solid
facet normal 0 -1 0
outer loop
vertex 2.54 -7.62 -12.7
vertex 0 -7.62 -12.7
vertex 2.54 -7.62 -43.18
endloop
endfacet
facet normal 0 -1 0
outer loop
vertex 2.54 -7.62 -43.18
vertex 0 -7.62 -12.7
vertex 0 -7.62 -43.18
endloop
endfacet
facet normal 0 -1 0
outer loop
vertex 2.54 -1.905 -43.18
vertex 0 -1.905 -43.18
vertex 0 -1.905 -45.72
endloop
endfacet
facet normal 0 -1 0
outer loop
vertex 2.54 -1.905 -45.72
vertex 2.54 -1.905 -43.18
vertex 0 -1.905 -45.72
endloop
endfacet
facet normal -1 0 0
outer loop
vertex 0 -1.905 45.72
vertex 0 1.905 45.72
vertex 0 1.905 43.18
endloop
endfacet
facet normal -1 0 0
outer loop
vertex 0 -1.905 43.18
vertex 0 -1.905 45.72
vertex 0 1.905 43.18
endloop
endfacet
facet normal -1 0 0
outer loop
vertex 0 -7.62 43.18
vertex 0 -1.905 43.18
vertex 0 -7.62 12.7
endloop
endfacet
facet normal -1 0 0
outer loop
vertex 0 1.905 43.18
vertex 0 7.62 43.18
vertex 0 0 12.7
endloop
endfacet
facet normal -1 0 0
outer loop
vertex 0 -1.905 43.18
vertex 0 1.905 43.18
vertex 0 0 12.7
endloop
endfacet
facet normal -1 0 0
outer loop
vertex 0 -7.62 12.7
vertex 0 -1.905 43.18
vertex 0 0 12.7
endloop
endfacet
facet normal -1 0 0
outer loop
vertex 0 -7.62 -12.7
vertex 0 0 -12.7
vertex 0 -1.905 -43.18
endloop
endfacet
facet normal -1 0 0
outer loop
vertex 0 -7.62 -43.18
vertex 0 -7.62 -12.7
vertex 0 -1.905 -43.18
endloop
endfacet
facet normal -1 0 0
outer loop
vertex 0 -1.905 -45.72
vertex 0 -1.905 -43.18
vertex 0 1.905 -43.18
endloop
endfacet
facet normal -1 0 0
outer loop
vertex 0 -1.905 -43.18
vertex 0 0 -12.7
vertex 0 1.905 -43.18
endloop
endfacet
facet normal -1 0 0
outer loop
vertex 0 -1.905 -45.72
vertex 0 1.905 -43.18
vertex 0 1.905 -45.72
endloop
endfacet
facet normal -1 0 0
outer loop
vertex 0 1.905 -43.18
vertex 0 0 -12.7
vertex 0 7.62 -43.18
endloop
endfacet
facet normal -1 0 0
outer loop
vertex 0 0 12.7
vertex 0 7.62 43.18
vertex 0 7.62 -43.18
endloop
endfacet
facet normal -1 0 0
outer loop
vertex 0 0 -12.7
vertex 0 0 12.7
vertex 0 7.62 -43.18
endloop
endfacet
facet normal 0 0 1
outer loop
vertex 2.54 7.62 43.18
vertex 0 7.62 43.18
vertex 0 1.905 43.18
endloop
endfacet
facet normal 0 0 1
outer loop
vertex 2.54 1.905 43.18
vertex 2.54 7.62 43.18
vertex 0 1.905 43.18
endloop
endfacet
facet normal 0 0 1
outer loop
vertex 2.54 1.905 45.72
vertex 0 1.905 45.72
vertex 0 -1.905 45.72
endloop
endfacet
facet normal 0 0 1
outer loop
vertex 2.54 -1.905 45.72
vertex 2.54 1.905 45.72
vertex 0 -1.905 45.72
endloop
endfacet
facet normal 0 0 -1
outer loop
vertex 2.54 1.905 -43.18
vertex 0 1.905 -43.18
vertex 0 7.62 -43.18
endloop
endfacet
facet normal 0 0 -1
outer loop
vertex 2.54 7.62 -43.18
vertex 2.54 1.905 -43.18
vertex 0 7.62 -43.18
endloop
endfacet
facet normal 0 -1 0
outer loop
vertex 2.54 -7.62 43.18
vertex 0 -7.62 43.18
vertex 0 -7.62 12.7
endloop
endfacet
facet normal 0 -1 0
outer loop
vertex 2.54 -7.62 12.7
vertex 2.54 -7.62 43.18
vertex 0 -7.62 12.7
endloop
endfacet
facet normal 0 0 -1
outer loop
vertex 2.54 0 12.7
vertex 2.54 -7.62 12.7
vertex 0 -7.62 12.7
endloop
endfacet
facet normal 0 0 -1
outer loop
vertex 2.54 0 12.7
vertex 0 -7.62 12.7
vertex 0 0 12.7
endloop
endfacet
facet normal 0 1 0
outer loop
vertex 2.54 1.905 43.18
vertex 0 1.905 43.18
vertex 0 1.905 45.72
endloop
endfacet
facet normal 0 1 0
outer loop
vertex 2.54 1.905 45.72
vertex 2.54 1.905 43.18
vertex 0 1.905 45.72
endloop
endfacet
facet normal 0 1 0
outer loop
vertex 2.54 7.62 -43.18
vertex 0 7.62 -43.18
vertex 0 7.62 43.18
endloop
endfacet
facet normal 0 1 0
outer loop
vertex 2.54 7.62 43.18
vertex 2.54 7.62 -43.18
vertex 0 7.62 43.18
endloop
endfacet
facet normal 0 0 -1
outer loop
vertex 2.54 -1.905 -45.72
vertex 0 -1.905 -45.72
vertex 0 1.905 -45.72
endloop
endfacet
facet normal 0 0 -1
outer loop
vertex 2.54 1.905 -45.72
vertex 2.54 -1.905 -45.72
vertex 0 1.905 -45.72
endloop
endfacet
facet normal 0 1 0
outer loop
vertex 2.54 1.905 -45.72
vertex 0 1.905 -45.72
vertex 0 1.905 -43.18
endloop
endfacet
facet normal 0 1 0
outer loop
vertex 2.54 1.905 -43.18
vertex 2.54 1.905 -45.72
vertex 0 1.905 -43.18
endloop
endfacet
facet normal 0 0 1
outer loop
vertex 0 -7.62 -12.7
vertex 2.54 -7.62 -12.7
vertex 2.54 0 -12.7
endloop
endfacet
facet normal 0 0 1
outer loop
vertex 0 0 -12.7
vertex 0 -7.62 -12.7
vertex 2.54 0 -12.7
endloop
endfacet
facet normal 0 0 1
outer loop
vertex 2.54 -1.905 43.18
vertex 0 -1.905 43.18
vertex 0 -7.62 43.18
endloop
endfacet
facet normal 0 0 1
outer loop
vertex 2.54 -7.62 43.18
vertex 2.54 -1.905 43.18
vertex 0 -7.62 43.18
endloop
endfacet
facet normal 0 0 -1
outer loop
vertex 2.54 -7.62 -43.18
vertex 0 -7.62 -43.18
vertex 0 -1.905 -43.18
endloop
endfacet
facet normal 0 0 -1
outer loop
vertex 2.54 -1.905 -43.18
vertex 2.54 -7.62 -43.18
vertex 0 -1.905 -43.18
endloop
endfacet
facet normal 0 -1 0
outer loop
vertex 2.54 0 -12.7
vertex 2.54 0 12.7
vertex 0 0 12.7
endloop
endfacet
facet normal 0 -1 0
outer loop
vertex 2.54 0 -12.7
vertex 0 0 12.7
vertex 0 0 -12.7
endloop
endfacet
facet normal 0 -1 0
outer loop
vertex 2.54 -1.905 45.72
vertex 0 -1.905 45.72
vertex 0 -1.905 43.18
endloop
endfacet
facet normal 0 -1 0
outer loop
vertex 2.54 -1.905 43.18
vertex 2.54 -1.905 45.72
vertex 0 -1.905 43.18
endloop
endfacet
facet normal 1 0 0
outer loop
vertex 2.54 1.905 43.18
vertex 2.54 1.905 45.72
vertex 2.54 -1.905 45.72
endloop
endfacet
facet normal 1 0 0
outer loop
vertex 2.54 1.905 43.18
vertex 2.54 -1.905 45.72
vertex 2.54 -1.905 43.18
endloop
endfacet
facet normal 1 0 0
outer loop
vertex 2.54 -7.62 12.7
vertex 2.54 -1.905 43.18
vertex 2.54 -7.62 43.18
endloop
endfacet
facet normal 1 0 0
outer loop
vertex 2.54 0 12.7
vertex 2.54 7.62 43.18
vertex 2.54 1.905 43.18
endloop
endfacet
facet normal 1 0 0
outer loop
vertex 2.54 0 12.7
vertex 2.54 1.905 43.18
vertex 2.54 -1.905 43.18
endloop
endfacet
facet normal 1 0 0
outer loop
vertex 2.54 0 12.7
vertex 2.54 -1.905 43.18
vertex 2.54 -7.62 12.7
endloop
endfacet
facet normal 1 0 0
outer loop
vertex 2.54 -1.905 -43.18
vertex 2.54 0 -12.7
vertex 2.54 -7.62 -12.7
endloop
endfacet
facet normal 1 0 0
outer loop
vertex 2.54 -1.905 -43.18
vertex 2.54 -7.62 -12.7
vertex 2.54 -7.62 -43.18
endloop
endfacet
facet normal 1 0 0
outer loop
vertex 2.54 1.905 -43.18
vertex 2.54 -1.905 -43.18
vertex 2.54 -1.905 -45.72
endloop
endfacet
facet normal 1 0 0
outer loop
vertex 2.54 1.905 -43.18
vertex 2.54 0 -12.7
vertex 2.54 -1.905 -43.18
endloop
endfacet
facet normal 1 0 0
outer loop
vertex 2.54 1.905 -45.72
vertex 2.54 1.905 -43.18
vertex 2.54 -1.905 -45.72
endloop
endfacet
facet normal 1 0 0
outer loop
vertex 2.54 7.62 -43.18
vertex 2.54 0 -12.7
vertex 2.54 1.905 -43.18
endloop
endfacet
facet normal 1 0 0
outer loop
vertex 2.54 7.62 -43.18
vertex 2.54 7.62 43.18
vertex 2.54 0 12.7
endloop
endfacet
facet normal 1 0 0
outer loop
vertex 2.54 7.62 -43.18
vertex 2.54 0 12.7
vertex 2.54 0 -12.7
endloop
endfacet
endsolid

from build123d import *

# Parameters (mm, degrees)
BOSS_EXTRUDE1_DEPTH = 2.54
CUT_EXTRUDE1_REACH  = 4.54
SKETCH2_W           = 25.4
SKETCH2_H           = 7.62


with BuildPart() as part:
    # Sketch1 → Boss-Extrude1 (new body)
    with BuildSketch(Plane(origin=(0, 0, 0), x_dir=(0, 0, -1), z_dir=(1, 0, 0))):
        Polygon((-43.18, 7.62), (-43.18, 1.905), (-45.72, 1.905), (-45.72, -1.905), (-43.18, -1.905), (-43.18, -7.62), (43.18, -7.62), (43.18, -1.905), (45.72, -1.905), (45.72, 1.905), (43.18, 1.905), (43.18, 7.62), align=None)
    extrude(amount=BOSS_EXTRUDE1_DEPTH)

    # Sketch2 → Cut-Extrude1 (cut, up to next)
    with BuildSketch(Plane(origin=(2.54, 0, 0), x_dir=(0, 0, -1), z_dir=(1, 0, 0)), mode=Mode.PRIVATE) as cut_extrude1_sk1:
        with Locations((0, -3.81)):
            Rectangle(SKETCH2_W, SKETCH2_H)
    cut_extrude1_tool1 = extrude(cut_extrude1_sk1.sketch, amount=-CUT_EXTRUDE1_REACH, mode=Mode.PRIVATE) & part.part
    add(cut_extrude1_tool1.solids().sort_by_distance((2.54, -3.81, 0))[0], mode=Mode.SUBTRACT)


solid = part.part
